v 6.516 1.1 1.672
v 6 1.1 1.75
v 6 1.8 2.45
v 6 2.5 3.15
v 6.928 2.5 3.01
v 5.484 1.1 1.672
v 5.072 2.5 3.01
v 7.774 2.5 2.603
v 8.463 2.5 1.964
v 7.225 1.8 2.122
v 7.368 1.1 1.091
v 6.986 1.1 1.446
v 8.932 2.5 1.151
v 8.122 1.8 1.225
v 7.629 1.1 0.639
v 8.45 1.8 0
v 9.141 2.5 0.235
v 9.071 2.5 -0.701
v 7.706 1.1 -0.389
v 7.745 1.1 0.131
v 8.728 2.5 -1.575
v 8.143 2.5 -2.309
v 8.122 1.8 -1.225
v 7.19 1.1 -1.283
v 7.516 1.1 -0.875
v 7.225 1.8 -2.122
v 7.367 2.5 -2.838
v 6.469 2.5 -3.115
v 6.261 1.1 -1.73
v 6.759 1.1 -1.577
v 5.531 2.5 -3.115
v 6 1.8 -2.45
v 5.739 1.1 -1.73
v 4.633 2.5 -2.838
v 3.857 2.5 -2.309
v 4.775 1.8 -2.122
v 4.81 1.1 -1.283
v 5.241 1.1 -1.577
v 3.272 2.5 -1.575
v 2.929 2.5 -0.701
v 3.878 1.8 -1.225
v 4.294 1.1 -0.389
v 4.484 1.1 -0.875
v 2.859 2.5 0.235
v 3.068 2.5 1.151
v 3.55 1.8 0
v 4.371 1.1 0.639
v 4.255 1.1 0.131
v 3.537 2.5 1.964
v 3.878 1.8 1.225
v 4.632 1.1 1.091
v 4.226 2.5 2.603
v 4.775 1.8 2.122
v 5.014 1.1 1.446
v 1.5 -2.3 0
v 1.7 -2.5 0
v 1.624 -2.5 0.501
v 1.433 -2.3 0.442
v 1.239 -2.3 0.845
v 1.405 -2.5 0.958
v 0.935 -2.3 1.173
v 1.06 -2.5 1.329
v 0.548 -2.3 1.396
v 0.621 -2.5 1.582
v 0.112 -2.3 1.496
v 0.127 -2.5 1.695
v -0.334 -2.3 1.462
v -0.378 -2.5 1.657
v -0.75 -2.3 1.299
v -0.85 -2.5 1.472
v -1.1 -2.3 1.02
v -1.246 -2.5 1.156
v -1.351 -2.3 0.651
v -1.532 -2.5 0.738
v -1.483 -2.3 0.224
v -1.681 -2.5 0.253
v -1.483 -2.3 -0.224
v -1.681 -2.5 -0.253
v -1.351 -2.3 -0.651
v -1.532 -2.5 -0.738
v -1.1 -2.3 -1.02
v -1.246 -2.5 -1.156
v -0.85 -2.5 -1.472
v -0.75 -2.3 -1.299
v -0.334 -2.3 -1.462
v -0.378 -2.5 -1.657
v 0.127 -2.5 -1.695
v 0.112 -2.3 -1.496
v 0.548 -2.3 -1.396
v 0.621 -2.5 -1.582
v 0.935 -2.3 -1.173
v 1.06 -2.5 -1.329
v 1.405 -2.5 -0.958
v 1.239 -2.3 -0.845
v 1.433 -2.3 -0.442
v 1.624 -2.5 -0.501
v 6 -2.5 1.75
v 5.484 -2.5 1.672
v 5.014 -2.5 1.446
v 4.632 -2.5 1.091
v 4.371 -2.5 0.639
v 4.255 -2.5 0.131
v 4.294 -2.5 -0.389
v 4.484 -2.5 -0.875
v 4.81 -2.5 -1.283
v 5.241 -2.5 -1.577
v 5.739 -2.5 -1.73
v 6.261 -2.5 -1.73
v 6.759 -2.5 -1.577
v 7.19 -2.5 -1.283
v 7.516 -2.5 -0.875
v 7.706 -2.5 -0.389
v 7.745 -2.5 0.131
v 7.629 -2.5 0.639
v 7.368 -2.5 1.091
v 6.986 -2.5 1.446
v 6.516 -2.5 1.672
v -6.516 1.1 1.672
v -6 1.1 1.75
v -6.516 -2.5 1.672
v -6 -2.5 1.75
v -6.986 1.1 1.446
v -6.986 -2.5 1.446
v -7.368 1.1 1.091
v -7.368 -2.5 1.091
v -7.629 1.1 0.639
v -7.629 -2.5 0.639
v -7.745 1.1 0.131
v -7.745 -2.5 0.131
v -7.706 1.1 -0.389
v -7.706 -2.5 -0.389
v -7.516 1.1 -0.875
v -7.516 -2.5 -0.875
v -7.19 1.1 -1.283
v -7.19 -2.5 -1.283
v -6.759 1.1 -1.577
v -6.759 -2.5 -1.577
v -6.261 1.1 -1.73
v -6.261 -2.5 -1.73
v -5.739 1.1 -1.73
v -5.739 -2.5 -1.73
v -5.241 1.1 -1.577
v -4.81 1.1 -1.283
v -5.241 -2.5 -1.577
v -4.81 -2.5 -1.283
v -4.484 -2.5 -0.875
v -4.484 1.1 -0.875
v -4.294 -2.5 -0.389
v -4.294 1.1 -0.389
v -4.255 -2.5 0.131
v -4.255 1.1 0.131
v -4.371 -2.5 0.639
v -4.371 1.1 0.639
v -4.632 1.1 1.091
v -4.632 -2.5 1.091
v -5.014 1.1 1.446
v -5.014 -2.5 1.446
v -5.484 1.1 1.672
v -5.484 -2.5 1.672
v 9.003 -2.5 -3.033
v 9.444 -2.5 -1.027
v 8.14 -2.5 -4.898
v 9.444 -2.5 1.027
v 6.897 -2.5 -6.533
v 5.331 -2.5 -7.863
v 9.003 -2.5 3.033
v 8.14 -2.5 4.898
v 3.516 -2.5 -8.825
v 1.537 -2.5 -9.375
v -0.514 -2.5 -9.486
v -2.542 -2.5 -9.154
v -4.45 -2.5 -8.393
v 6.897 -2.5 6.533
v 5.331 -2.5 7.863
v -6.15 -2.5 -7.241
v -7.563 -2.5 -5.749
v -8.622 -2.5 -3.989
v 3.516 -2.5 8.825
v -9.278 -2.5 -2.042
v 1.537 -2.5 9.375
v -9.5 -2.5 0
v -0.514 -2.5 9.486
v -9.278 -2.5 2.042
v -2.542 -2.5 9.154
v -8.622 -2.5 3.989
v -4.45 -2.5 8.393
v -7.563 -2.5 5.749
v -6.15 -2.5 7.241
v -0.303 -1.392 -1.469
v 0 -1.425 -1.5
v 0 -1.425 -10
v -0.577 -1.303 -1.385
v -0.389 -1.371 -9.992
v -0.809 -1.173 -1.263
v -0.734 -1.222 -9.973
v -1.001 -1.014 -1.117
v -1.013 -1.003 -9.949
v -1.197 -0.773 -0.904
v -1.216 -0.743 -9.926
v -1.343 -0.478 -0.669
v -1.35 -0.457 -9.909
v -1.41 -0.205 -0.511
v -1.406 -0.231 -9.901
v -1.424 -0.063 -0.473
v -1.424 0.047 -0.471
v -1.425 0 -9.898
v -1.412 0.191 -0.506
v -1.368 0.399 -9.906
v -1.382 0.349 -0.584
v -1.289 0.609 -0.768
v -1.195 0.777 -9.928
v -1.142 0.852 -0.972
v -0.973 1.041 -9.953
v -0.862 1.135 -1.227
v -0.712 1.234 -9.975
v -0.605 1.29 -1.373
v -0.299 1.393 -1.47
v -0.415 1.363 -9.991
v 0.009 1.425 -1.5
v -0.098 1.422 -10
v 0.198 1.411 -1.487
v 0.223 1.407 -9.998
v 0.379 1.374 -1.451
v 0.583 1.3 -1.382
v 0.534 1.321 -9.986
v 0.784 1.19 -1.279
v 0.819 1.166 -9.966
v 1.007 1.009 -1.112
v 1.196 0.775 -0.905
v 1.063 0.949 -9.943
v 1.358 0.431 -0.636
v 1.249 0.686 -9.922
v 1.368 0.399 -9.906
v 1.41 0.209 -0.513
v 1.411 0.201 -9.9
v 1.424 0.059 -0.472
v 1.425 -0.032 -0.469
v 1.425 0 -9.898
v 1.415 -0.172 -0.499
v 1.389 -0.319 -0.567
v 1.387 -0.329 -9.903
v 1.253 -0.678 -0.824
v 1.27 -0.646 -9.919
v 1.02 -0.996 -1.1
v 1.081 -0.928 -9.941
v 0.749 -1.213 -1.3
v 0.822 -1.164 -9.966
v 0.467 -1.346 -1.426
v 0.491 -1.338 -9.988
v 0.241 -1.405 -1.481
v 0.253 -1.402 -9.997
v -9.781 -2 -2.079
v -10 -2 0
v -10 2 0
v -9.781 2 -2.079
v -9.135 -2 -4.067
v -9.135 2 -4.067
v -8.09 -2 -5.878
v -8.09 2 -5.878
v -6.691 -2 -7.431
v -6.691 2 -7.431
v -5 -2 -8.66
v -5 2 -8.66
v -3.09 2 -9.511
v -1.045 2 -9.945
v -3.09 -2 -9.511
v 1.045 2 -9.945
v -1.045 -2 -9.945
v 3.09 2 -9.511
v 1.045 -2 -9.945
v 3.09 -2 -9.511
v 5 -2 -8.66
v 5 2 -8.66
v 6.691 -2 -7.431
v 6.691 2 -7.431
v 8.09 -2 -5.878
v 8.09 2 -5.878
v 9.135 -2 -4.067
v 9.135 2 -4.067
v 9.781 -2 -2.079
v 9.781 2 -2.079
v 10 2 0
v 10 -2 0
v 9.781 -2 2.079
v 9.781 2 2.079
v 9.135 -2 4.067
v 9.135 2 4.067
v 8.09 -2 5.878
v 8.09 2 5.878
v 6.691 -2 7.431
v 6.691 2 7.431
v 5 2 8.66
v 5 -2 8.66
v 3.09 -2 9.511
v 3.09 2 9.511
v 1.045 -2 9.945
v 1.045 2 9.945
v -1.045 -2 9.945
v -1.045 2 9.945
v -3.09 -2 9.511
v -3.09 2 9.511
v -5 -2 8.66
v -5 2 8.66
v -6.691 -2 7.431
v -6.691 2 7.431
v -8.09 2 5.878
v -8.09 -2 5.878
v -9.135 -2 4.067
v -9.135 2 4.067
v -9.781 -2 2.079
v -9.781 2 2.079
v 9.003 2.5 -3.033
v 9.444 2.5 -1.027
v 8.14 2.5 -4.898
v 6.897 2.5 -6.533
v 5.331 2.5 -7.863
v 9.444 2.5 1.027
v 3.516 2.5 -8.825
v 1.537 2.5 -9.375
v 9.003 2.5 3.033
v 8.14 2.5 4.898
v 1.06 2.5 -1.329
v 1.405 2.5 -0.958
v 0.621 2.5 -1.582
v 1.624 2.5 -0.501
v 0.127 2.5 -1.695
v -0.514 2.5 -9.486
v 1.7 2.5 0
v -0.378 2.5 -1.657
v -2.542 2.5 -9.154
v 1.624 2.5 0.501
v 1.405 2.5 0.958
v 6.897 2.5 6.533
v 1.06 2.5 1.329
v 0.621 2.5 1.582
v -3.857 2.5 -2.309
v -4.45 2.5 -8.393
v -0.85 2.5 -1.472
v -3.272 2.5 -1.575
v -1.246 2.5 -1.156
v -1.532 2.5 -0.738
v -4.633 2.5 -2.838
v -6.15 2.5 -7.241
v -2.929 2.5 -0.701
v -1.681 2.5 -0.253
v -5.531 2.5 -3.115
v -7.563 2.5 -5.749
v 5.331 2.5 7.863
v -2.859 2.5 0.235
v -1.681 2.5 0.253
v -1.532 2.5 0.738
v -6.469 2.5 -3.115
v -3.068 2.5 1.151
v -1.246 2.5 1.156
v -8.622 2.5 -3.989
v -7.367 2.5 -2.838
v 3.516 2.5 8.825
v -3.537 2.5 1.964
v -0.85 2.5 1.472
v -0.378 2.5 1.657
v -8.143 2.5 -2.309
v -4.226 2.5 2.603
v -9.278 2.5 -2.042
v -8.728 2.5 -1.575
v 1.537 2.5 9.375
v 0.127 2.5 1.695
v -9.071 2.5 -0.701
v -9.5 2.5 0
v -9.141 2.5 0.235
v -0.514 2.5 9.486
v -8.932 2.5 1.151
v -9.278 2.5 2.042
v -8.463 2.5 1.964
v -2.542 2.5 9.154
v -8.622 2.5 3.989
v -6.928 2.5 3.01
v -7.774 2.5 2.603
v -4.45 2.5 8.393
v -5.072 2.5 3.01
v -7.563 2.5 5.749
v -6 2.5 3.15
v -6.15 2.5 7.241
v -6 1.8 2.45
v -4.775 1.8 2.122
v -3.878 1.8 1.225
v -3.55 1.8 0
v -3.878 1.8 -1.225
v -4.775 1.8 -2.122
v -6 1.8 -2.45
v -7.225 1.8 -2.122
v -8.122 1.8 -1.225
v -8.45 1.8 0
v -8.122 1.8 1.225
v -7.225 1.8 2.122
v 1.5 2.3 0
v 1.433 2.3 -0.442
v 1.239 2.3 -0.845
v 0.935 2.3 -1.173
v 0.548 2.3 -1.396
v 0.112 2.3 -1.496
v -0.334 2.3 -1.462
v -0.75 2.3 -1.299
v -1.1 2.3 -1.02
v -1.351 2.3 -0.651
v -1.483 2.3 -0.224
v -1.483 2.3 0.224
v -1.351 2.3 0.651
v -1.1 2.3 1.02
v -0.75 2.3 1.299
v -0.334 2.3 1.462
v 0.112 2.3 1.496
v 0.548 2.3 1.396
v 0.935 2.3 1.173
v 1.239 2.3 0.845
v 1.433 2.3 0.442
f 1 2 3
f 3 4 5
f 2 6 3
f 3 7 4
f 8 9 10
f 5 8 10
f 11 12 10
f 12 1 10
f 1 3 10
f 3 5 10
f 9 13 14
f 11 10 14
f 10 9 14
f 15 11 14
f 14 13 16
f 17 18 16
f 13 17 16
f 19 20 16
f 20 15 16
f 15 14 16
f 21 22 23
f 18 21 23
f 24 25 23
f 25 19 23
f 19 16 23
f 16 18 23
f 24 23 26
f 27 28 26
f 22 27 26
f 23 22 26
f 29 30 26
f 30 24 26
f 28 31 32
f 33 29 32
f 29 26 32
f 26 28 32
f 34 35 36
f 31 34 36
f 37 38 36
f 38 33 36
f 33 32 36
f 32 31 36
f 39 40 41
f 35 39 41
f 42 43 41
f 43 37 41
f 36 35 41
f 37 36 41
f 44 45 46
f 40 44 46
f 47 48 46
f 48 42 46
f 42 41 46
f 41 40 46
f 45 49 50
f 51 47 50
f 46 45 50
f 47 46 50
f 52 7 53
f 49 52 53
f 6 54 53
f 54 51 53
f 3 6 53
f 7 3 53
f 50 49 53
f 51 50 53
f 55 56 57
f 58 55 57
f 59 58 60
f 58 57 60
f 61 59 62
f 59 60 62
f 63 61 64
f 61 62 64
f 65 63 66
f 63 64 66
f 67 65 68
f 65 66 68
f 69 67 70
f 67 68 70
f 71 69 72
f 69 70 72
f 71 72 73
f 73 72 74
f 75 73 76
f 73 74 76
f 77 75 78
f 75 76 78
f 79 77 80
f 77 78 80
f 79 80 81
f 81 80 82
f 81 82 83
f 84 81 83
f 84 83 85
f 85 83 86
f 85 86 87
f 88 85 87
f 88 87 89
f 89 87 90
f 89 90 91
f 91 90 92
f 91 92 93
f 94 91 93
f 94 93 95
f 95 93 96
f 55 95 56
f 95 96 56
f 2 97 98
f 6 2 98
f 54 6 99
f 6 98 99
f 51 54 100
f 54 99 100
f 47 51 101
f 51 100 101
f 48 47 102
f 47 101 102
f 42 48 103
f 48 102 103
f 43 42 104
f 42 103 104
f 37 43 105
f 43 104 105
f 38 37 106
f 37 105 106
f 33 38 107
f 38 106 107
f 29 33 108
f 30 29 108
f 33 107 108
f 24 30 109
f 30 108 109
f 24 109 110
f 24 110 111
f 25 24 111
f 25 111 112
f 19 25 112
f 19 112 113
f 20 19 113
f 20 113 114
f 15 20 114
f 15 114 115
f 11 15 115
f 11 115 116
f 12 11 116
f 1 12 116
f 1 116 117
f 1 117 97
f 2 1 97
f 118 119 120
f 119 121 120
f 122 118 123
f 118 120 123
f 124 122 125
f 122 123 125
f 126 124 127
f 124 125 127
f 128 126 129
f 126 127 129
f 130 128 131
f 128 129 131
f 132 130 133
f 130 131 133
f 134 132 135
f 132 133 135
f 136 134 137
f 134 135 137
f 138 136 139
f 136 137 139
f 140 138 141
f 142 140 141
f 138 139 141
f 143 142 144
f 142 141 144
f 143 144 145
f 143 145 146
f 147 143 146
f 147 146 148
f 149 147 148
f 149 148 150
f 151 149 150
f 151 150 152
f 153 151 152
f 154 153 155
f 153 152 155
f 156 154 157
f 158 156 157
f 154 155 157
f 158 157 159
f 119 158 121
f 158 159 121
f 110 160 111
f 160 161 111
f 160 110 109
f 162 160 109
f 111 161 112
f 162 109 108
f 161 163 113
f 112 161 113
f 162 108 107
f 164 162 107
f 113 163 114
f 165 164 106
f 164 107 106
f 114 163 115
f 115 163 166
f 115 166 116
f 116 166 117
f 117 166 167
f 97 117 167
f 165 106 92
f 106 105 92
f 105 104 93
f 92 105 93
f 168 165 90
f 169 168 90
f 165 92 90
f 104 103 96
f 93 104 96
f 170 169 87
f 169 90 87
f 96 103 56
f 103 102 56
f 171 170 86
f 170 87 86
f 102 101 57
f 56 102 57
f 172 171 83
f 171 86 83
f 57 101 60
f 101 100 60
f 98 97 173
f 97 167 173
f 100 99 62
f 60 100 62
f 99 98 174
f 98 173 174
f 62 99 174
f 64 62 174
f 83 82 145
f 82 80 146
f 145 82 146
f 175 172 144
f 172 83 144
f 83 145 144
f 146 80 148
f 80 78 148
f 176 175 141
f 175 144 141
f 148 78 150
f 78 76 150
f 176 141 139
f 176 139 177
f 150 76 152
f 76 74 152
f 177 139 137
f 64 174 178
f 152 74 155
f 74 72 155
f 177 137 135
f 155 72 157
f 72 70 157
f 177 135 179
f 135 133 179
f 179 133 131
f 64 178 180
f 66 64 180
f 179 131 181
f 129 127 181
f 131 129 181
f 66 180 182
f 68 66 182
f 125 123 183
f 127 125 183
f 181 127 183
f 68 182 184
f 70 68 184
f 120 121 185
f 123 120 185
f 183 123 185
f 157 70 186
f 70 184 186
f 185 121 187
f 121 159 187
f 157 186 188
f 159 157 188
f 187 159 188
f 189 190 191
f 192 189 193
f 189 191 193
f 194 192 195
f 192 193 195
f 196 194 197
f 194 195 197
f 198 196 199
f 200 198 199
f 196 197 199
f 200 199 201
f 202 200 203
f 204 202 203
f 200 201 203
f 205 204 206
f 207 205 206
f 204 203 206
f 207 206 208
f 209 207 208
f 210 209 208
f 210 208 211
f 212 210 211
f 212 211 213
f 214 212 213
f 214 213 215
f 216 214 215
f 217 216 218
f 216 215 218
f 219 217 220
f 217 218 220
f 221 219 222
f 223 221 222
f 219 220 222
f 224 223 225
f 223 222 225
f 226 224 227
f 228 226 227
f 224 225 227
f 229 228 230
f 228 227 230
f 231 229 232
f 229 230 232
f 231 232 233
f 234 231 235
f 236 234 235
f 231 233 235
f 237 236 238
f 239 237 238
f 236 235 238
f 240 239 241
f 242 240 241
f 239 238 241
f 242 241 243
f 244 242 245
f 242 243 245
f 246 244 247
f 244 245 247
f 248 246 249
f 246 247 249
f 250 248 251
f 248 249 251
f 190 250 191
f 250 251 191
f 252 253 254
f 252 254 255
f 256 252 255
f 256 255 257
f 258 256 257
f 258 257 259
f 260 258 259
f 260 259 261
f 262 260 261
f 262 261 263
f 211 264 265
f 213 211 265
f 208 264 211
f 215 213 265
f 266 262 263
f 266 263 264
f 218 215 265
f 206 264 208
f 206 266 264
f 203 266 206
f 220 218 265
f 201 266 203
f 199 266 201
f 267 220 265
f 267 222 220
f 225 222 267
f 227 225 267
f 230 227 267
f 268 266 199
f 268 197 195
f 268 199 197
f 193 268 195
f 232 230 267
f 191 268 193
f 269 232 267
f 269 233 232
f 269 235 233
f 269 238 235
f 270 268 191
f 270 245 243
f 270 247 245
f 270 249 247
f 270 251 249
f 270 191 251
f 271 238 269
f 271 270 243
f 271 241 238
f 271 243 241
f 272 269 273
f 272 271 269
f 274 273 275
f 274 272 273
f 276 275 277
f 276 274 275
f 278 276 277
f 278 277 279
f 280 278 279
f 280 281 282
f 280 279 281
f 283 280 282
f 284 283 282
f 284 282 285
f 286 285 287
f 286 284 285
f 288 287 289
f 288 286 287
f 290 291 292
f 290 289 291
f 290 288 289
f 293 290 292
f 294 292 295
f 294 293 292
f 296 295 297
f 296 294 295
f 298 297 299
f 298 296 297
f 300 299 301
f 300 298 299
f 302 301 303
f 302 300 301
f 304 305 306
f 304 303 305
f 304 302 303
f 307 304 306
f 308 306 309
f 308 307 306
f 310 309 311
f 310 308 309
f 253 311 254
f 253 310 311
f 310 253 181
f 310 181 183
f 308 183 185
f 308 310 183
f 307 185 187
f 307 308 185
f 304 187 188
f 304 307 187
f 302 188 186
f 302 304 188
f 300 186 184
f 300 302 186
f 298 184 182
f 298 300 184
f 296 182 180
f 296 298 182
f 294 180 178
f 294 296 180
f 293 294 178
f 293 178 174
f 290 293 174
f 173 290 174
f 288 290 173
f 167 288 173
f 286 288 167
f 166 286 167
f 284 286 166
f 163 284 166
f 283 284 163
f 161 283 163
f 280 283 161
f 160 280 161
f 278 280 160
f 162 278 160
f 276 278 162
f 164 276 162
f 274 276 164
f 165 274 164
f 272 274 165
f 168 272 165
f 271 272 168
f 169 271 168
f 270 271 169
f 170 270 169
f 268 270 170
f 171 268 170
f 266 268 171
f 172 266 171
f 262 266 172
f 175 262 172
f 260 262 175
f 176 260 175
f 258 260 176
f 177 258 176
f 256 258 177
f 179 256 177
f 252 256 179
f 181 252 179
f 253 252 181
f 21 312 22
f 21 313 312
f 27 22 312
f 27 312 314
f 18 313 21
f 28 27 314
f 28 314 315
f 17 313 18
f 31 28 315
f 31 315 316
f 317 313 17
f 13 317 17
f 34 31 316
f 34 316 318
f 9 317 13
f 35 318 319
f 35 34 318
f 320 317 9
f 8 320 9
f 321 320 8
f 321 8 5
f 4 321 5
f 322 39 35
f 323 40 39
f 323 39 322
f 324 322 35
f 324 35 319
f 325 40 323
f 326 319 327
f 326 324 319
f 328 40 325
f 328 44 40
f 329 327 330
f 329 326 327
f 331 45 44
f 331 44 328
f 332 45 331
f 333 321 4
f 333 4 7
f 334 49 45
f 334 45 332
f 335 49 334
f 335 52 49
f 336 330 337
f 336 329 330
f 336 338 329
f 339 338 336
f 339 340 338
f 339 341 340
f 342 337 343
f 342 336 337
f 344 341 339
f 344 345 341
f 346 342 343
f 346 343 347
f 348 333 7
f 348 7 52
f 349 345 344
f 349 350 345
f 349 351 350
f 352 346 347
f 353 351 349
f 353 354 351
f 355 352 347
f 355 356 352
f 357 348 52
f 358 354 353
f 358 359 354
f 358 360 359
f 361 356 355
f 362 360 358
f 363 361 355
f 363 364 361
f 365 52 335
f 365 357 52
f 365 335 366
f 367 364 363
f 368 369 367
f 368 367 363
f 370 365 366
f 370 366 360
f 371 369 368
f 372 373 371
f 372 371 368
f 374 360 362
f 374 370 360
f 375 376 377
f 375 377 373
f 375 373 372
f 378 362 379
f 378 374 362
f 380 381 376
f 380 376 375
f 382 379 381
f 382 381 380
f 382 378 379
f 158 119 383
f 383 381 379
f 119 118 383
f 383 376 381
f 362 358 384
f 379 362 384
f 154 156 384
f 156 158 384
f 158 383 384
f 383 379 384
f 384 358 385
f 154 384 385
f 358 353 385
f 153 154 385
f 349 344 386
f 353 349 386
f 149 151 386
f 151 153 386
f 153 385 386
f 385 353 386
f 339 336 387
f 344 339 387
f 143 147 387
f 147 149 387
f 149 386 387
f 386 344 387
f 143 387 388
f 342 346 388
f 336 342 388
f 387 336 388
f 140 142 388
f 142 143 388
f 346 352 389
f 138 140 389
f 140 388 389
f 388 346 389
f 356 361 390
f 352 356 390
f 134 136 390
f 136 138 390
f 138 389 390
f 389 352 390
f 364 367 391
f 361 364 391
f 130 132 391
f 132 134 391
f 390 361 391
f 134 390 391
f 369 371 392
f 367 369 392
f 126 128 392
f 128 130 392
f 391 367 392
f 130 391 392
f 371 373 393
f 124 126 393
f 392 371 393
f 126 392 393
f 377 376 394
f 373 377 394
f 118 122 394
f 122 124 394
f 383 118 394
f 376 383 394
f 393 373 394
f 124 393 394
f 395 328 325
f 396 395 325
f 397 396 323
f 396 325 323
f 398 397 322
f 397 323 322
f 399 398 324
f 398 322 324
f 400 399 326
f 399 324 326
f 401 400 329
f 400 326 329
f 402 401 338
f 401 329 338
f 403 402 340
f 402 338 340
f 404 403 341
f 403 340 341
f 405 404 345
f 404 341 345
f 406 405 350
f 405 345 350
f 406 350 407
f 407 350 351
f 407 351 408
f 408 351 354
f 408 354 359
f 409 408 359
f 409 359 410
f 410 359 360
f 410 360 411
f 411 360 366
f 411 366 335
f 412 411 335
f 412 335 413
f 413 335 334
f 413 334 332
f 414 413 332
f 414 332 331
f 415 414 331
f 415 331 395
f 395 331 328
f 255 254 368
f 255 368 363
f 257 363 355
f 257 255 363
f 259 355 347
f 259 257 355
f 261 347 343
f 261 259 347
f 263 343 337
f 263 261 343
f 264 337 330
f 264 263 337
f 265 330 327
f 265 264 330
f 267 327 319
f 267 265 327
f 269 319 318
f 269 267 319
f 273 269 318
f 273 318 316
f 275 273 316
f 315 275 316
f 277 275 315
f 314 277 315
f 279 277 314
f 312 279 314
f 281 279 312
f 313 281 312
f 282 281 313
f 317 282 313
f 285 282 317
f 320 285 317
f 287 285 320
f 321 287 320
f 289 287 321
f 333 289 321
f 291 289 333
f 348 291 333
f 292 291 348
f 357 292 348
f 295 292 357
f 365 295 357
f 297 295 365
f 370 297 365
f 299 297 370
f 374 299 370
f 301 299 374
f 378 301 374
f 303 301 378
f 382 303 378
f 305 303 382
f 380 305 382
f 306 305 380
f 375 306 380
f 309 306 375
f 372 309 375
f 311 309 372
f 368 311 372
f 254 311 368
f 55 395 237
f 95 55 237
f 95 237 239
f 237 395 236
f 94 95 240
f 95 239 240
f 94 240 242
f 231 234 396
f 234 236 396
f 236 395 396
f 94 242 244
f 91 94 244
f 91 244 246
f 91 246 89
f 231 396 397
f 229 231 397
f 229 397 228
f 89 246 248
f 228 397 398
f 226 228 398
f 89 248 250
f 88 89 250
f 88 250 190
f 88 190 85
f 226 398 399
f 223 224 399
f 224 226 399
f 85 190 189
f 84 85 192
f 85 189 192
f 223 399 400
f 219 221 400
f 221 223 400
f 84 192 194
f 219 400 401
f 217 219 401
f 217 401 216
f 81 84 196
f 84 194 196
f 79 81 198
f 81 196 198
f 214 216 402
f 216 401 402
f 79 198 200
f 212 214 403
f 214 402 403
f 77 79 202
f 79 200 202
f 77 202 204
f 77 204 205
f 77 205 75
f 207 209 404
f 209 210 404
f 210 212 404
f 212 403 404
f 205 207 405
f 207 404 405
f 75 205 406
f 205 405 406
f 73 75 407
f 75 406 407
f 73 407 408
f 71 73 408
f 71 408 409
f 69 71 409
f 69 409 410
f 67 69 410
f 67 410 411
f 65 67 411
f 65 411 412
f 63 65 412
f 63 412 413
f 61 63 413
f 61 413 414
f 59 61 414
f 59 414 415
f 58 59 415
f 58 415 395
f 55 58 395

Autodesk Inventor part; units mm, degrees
ref_plane "YZ Plane" through (0, 0, 0) normal (1, 0, 0) x (0, 1, 0)
ref_plane "XZ Plane" through (0, 0, 0) normal (0, 1, 0) x (-1, 0, 0)
ref_plane "XY Plane" through (0, 0, 0) normal (0, 0, 1) x (1, 0, 0)
sketch "Sketch4" plane through (0, 0, 0) normal (0, 1, 0) x (-1, 0, 0)
  circle A0 centre (0, 0) radius 10
extrude "Extrusion2" add sketch "Sketch4" along normal mid plane 5
sketch "Sketch8" plane through (0, 2.5, 0) normal (0, 1, 0) x (1, 0, 0)
  point P0 (0, 0)
  point P1 (-6, 0)
  point P2 (6, 0)
  dimension "d63" = 6
  dimension "d64" = 12
hole "Hole5" at (-6, 2.5, 0) at (6, 2.5, 0) direction (0, -1, 0) diameter 3.5 depth 22.2 countersink diameter 6.3 countersink angle 90
sketch "Sketch9" plane through (0, 2.5, 0) normal (0, 1, 0) x (1, 0, 0)
  line L0 (-1.5, 1.5) -> (1.5, 1.5) construction
  line L1 (1.5, 1.5) -> (1.5, -1.5) construction
  line L2 (1.5, -1.5) -> (-1.5, -1.5) construction
  line L3 (-1.5, -1.5) -> (-1.5, 1.5) construction
  line L4 (-1.5, 1.5) -> (1.5, -1.5) construction
  line L5 (1.5, 1.5) -> (-1.5, -1.5) construction
  circle A0 centre (0, 0) radius 1.5
  dimension "d72" = 3
  dimension "d73" = 3
  dimension "d86" = 3
extrude "Extrusion5" cut sketch "Sketch9" against normal blind 10
sketch "Sketch10" plane through (-1.5, 2.5, 0) normal (0, 0, 1) x (1, 0, 0)
  point P0 (1.5, -2.5)
  point P1 (1.5, -2.5)
hole "Hole6" at (0, 0, 0) direction (0, 0, -1) diameter 2.85 depth 10.4 thread size "M3.5x0.6" class "6H" standard "ISO Metric profile"
chamfer "Chamfer1" distance 0.5 angle 45 2 edges at (10, 2.5, 0) (10, -2.5, 0)
chamfer "Chamfer2" distance 0.2 angle 45 2 edges at (-1.5, 2.5, 0) (-1.5, -2.5, 0)
equation "\"d73\" = d72"
properties part number "Wheel Mounting Cap" material "Mild Steel S355 J2"
